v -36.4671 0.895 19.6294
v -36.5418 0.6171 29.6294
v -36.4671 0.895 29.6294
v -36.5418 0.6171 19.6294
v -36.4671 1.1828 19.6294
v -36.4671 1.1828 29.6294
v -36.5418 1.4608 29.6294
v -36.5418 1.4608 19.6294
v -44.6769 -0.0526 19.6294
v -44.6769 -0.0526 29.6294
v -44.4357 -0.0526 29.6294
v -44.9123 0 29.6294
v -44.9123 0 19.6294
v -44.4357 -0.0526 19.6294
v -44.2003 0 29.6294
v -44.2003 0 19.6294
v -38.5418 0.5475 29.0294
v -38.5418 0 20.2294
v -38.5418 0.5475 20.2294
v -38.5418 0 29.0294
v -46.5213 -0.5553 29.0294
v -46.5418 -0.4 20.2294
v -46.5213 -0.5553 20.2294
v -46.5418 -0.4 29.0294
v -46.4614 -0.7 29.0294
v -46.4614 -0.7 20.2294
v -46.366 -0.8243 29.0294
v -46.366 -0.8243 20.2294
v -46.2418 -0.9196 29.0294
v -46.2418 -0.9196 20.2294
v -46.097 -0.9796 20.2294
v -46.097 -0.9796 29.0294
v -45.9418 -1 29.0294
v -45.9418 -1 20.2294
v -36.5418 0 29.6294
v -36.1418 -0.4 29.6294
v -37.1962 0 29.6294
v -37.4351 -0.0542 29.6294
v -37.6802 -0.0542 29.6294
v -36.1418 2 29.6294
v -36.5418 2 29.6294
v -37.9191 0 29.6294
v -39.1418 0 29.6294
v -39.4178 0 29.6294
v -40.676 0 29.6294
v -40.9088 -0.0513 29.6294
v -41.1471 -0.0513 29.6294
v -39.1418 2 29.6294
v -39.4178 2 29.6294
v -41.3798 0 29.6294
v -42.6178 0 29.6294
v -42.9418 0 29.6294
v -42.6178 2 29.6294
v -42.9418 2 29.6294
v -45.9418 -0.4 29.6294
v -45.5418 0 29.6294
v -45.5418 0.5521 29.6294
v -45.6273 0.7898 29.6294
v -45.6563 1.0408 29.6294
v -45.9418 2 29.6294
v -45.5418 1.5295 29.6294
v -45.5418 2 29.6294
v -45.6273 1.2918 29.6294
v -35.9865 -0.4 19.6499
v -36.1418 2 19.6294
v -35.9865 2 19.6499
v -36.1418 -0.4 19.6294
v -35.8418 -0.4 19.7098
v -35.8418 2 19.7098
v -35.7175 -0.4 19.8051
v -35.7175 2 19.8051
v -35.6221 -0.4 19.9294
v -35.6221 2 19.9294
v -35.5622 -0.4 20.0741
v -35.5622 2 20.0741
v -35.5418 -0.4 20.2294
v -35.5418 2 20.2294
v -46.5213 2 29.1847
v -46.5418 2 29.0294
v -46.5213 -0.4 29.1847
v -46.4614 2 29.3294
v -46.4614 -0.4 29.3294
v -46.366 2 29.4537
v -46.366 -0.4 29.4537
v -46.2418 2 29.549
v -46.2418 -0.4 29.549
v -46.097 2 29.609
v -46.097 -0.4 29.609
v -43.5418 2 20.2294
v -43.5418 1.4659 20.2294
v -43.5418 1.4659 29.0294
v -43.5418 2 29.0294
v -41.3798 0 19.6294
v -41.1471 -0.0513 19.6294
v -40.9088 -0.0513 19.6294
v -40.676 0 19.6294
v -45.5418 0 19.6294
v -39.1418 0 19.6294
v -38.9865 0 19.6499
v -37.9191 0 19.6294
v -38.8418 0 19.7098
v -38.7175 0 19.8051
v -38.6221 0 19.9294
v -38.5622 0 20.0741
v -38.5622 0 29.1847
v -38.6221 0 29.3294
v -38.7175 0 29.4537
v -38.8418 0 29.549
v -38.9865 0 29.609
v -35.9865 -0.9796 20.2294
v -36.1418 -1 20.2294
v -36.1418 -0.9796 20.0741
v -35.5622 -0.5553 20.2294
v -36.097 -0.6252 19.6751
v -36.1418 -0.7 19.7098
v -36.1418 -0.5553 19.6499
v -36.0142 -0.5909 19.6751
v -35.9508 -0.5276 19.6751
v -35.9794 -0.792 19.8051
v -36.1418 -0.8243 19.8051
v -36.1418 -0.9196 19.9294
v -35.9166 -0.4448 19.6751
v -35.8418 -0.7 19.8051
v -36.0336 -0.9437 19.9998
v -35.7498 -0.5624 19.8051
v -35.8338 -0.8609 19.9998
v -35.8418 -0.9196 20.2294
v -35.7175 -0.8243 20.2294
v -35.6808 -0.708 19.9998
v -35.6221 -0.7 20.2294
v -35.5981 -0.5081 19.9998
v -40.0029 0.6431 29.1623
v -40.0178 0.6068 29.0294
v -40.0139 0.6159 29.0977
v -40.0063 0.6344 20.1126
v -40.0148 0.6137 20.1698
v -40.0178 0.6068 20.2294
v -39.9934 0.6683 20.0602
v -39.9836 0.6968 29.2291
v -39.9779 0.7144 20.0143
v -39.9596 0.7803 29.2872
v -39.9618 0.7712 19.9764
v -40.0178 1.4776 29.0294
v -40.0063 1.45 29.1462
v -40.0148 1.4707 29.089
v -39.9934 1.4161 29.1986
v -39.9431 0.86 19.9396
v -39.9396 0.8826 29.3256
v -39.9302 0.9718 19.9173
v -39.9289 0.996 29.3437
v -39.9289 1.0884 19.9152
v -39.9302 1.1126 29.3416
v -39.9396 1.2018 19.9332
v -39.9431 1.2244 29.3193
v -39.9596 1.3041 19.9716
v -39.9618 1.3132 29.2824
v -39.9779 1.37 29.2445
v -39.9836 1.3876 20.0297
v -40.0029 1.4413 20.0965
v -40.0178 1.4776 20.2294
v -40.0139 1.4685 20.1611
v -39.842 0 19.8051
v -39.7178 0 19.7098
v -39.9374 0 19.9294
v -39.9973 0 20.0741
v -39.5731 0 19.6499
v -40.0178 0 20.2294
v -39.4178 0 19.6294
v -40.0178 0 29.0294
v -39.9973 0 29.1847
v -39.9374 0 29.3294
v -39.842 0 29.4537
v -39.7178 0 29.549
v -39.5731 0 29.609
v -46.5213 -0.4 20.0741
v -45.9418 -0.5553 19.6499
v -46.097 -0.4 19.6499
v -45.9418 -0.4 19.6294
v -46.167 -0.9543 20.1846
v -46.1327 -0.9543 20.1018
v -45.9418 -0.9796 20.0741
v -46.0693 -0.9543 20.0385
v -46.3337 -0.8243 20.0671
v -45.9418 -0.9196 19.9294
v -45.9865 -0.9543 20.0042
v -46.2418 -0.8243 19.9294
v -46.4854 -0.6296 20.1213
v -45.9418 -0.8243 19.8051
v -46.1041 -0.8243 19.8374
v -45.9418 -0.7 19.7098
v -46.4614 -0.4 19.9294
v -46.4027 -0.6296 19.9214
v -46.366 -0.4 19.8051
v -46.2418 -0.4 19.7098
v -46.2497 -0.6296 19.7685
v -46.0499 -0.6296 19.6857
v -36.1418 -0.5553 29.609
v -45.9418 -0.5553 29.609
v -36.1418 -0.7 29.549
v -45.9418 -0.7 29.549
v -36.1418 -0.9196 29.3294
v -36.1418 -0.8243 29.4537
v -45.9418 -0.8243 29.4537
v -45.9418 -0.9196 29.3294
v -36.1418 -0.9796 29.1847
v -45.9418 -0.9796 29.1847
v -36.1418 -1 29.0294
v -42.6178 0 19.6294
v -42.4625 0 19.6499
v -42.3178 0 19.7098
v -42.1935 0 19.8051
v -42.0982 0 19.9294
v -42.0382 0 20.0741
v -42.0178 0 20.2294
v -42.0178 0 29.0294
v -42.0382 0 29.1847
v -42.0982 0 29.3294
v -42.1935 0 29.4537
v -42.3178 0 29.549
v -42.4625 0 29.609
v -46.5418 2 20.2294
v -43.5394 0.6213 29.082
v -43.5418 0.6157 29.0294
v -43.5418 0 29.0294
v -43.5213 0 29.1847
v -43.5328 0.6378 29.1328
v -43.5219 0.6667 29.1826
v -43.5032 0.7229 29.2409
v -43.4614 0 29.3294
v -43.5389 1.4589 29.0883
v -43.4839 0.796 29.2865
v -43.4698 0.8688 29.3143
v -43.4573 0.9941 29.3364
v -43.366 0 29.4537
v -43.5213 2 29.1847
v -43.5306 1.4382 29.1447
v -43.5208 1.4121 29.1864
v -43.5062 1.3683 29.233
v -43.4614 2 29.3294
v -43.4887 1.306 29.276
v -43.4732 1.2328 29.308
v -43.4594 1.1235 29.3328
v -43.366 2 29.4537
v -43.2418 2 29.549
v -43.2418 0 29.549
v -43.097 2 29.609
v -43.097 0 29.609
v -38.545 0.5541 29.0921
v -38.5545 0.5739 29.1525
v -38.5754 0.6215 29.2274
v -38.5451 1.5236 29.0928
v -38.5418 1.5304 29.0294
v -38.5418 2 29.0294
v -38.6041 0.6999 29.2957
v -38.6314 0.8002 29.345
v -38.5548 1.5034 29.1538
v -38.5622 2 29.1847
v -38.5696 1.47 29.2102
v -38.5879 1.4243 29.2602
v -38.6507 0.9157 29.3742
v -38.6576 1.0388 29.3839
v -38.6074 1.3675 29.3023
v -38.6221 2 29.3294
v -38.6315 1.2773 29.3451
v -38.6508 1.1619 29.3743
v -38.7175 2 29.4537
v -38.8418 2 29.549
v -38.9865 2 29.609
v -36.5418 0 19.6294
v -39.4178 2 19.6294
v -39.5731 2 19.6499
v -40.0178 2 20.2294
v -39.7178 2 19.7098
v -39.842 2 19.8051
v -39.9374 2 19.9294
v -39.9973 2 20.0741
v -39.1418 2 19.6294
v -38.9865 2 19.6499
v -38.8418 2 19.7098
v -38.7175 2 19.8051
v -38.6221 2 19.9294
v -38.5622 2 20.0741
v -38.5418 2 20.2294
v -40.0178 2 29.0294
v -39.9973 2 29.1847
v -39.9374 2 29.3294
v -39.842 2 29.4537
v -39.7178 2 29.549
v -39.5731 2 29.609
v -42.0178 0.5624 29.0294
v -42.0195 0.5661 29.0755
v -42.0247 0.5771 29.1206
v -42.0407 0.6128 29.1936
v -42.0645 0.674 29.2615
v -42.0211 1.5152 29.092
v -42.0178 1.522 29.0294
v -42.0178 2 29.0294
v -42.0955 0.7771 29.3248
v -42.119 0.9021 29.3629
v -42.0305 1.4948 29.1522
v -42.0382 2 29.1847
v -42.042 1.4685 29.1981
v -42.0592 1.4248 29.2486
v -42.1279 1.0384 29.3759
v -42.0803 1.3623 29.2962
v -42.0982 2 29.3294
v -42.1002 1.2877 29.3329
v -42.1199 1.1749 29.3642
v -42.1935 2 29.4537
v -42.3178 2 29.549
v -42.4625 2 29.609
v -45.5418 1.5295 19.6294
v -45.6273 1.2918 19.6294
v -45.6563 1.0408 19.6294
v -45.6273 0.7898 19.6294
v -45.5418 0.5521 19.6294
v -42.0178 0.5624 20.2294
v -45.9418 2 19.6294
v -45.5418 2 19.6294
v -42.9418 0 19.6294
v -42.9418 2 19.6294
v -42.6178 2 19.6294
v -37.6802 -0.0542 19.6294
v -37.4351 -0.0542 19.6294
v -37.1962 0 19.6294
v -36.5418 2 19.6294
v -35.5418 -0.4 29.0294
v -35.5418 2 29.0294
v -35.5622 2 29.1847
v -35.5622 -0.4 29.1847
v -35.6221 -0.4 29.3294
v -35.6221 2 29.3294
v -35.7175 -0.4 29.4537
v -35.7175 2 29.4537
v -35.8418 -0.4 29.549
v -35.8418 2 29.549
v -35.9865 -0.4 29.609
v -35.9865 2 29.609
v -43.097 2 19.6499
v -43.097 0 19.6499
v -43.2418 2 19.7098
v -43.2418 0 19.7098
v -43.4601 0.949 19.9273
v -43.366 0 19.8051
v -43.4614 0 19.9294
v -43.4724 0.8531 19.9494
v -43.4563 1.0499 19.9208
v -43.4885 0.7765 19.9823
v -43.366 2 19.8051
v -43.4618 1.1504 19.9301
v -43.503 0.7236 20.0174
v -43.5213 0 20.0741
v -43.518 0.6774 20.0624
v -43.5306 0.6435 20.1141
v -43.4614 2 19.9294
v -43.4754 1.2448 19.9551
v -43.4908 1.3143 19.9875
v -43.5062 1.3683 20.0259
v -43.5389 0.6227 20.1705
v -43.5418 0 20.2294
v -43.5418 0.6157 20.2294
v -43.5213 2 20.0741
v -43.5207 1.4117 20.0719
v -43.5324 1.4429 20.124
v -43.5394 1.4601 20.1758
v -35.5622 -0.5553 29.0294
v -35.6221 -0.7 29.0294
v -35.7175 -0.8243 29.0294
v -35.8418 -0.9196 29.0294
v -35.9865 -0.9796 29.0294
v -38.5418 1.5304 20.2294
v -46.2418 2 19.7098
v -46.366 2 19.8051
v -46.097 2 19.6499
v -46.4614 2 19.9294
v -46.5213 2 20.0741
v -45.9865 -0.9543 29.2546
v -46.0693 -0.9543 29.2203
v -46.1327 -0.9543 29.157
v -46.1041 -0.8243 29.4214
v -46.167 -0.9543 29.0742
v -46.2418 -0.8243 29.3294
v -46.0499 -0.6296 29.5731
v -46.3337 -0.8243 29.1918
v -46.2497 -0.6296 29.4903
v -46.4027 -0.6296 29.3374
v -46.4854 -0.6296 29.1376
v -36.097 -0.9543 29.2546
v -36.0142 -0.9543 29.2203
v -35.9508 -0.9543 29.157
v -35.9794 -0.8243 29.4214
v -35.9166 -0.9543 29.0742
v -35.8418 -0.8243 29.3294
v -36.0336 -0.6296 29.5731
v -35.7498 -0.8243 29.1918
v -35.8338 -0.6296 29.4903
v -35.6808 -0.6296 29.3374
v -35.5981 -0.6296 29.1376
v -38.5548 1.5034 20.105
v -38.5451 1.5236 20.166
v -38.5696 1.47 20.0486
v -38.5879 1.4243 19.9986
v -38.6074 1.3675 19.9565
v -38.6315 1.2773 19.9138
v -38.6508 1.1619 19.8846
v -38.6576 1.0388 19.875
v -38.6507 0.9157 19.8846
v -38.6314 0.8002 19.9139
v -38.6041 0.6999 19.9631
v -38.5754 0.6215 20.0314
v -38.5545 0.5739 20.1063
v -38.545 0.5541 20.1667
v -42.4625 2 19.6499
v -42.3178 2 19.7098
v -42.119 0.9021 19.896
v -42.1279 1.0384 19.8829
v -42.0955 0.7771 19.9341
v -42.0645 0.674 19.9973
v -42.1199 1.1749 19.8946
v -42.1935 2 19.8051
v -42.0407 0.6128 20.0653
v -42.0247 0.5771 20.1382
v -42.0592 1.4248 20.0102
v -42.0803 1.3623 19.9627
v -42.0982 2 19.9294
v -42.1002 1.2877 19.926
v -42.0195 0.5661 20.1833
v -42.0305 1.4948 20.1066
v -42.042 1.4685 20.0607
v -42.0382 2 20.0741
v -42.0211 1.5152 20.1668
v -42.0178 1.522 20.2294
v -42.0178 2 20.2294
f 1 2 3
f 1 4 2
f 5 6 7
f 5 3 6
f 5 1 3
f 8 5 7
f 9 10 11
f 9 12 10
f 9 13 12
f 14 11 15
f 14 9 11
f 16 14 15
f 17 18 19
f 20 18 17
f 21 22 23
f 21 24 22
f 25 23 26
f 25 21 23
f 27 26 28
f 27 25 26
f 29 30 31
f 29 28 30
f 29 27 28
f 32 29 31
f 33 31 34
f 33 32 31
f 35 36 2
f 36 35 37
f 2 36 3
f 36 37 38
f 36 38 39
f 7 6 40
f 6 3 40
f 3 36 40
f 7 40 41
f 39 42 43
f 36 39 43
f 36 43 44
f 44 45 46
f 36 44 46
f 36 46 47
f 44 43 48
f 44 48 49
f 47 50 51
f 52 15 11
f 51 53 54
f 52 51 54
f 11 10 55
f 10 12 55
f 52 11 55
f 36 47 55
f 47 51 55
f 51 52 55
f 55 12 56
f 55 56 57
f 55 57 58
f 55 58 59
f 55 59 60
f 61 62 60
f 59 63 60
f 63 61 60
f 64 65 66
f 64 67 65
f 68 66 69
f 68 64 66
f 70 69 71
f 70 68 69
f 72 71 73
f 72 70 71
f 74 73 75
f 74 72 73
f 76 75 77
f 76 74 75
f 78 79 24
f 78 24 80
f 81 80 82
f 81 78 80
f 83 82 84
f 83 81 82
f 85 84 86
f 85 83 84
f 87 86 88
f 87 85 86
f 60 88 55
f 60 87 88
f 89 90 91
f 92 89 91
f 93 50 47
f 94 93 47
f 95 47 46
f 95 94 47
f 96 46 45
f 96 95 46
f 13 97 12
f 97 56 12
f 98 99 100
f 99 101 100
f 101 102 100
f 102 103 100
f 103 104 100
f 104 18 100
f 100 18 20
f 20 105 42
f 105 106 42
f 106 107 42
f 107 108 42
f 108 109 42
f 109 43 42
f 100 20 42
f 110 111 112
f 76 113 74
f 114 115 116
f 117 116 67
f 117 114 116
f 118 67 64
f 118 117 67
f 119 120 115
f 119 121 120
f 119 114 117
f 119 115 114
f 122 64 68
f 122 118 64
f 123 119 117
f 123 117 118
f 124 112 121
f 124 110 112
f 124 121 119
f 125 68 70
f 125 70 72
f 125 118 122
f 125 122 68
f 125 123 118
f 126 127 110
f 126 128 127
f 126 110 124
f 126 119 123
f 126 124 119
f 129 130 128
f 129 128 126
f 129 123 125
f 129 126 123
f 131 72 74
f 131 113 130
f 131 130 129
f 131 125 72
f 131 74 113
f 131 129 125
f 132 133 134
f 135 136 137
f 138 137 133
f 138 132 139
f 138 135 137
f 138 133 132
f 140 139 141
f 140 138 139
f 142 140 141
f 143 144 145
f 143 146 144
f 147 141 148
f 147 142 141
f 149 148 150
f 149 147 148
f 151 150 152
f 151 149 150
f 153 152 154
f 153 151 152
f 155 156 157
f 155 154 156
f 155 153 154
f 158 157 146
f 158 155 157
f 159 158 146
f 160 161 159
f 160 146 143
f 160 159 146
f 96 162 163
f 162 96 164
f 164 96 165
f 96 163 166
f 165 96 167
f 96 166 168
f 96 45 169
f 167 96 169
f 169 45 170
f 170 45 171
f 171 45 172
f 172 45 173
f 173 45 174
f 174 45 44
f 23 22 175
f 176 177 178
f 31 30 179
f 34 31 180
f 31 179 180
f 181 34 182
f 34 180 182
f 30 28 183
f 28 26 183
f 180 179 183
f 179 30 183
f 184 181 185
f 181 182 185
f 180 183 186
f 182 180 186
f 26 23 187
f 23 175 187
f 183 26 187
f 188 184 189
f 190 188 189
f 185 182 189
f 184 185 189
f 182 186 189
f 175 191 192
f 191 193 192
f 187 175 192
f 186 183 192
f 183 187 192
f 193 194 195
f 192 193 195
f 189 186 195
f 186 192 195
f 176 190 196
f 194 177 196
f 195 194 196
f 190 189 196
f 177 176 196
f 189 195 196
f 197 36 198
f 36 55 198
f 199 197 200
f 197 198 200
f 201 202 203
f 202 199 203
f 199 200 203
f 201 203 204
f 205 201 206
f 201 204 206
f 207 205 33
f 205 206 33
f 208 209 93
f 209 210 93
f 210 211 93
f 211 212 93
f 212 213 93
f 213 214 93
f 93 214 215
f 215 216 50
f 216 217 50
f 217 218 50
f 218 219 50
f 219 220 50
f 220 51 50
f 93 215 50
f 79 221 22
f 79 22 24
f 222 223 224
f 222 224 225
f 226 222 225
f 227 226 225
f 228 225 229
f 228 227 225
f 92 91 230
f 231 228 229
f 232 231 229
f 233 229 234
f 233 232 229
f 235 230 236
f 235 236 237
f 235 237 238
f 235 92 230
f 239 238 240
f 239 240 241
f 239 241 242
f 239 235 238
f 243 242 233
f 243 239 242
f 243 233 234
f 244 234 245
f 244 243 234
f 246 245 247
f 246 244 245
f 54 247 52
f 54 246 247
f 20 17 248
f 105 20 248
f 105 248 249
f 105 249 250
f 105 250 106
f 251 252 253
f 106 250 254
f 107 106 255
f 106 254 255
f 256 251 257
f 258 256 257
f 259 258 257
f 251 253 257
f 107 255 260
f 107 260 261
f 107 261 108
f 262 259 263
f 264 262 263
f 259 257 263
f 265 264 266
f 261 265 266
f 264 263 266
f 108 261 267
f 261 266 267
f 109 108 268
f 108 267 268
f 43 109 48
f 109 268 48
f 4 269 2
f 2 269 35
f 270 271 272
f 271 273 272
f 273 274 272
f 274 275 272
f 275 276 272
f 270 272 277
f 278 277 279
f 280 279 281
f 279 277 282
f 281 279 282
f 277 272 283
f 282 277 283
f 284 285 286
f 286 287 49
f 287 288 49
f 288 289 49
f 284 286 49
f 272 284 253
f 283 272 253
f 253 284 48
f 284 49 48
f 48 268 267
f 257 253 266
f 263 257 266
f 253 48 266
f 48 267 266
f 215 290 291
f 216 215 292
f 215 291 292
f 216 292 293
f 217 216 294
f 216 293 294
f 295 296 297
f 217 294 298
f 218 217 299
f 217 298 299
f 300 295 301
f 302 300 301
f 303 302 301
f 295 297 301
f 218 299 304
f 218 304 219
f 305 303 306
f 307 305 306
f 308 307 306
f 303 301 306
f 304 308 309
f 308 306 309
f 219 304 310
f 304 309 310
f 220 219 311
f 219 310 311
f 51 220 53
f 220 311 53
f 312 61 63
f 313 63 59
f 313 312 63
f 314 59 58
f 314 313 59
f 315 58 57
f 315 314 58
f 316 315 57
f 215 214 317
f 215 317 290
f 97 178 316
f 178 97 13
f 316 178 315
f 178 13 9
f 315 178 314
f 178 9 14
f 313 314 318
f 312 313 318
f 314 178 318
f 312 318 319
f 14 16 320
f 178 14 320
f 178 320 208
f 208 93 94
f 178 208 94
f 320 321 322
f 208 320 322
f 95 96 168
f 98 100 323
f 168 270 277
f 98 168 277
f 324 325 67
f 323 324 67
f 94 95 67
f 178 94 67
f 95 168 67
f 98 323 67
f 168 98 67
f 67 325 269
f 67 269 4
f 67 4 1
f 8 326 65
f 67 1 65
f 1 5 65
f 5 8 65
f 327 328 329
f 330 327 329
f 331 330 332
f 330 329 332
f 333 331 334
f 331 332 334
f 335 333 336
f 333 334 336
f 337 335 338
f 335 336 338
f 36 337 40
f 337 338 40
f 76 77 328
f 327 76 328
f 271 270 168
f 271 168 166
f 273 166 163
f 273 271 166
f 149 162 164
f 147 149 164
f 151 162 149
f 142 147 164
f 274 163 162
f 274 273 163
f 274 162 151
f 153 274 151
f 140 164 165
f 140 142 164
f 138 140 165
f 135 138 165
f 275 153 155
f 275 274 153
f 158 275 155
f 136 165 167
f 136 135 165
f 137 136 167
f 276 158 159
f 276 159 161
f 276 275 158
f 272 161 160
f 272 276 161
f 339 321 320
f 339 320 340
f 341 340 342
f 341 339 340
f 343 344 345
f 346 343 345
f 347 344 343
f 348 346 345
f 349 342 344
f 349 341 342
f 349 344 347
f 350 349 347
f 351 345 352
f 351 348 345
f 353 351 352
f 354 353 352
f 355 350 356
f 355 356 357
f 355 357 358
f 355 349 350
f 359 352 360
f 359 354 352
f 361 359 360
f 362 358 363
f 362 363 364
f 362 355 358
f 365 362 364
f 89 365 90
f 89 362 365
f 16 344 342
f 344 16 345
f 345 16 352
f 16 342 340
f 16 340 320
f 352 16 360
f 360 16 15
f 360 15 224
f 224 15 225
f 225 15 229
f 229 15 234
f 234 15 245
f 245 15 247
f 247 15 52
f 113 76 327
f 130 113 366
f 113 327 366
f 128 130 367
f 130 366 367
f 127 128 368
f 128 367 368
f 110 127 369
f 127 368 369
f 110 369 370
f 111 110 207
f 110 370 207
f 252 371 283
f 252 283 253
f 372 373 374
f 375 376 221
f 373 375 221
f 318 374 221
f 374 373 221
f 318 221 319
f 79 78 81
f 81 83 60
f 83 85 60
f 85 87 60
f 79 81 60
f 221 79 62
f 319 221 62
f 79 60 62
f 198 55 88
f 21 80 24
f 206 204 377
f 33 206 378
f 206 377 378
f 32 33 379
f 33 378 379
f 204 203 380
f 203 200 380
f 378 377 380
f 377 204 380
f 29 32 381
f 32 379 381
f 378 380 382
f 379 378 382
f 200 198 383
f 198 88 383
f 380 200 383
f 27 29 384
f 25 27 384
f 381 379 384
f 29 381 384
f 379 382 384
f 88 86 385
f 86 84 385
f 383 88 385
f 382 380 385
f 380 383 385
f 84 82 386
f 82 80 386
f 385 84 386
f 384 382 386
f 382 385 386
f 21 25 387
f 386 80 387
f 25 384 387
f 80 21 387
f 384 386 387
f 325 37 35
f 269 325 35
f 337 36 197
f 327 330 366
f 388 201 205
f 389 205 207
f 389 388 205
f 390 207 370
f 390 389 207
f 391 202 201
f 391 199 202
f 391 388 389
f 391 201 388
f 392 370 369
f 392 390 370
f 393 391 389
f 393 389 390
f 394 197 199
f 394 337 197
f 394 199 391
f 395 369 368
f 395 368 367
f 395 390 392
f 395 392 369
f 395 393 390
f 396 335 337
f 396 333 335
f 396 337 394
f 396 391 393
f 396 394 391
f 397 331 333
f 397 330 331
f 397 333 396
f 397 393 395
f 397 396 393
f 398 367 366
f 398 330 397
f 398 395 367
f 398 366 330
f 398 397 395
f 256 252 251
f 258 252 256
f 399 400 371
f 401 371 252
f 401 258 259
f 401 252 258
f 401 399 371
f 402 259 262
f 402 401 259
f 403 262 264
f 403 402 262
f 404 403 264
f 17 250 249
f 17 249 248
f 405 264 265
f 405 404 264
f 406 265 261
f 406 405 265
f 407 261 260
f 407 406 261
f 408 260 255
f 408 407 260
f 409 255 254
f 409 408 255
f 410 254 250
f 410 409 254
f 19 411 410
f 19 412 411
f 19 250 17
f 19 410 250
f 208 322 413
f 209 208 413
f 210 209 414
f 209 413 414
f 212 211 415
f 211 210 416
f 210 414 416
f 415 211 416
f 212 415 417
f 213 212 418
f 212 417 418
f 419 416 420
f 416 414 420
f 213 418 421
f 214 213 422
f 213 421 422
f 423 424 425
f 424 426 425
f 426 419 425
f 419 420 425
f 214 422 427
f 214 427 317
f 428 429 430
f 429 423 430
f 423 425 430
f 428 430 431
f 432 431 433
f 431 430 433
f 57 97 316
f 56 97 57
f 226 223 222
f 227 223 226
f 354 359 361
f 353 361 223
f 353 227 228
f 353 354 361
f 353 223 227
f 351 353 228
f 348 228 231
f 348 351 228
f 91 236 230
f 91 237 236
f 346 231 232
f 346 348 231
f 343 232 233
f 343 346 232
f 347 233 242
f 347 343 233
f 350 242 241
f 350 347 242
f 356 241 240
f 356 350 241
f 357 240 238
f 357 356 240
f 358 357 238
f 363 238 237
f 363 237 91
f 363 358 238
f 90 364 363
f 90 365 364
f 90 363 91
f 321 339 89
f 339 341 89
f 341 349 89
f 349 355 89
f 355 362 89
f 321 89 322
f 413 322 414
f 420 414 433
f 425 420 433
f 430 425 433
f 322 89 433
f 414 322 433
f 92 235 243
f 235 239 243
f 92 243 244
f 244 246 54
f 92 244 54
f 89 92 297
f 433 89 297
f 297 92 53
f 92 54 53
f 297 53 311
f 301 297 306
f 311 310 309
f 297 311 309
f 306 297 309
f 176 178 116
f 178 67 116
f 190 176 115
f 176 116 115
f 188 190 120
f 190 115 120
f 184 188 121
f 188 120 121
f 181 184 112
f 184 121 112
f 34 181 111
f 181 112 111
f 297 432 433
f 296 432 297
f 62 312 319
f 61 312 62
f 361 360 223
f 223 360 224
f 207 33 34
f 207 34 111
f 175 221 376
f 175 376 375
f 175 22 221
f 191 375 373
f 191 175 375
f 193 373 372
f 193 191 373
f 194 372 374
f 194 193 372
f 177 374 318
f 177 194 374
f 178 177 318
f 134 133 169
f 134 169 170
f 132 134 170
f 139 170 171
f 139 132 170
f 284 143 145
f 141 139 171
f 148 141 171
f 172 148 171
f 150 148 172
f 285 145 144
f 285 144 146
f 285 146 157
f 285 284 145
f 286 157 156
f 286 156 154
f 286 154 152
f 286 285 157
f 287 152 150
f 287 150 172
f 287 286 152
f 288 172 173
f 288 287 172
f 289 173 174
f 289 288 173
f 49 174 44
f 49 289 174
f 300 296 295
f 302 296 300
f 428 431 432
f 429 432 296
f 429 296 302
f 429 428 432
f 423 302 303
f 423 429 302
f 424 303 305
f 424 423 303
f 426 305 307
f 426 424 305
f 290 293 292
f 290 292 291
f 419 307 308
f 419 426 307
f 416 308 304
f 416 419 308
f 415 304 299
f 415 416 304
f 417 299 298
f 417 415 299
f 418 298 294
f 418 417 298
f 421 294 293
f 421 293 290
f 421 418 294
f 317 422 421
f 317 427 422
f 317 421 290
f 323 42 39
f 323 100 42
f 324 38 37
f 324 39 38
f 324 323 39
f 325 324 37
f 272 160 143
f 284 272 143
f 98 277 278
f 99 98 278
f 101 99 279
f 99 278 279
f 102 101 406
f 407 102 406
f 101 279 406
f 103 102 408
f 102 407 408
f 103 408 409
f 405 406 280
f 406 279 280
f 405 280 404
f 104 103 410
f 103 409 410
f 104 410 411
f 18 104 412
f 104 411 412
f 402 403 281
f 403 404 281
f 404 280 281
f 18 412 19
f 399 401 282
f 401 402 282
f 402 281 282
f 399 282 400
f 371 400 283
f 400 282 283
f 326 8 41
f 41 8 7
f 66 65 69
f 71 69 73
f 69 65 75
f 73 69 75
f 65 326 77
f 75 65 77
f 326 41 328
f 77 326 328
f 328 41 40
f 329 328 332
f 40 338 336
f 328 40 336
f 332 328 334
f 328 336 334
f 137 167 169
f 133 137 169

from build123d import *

# Parameters (mm, degrees)
F0_W     = 1
F0_H     = 10
F1_DEPTH = 2
F0_W_2   = 1.5239776969
F0_W_3   = 1.4760223031
F0_W_4   = 2
F2_DEPTH = 1
F3_R     = 0.6
F4_R     = 1.1
F5_DEPTH = 50


with BuildPart() as f1:
    # F0 (on Front) → F1 (new body)
    with BuildSketch(Plane.XZ):
        with Locations((-46.041754216, 24.6294103354)):
            Rectangle(F0_W, F0_H)
    extrude(amount=-F1_DEPTH)



with BuildPart() as f1b:
    # F0 (on Front) → F1, piece 2 (new body)
    with BuildSketch(Plane.XZ):
        with Locations((-42.7797653675, 24.6294103354)):
            Rectangle(F0_W_2, F0_H)
    extrude(amount=-F1_DEPTH)


with BuildPart() as f1c:
    # F0 (on Front) → F1, piece 3 (new body)
    with BuildSketch(Plane.XZ):
        with Locations((-39.2797653675, 24.6294103354)):
            Rectangle(F0_W_3, F0_H)
    extrude(amount=-F1_DEPTH)


with BuildPart() as f1d:
    # F0 (on Front) → F1, piece 4 (new body)
    with BuildSketch(Plane.XZ):
        with Locations((-36.041754216, 24.6294103354)):
            Rectangle(F0_W, F0_H)
    extrude(amount=-F1_DEPTH)


with BuildPart() as f1_1:
    add(f1.part)

    add(f1b.part)  # F2 merges F1b

    add(f1c.part)  # F2 merges F1c

    add(f1d.part)  # F2 merges F1d
    # F0 (on Front) → F2 (join)
    with BuildSketch(Plane.XZ):
        with Locations((-41.0177765191, 24.6294103354)):
            Rectangle(F0_W_4, F0_H)
        with Locations((-39.2797653675, 24.6294103354)):
            Rectangle(F0_W_3, F0_H)
        with Locations((-46.041754216, 24.6294103354)):
            Rectangle(F0_W, F0_H)
        with Locations((-44.541754216, 24.6294103354)):
            Rectangle(F0_W_4, F0_H)
        with Locations((-36.041754216, 24.6294103354)):
            Rectangle(F0_W, F0_H)
        with Locations((-42.7797653675, 24.6294103354)):
            Rectangle(F0_W_2, F0_H)
        with Locations((-37.541754216, 24.6294103354)):
            Rectangle(F0_W_4, F0_H)
    extrude(amount=F2_DEPTH)

    # F3
    f3_edges = [f1_1.edges().sort_by_distance(p)[0] for p in [
        (-43.541754, 1, 29.62941),
        (-42.017777, 1, 29.62941),
        (-40.017777, 1, 19.62941),
        (-38.541754, 1, 19.62941),
        (-40.017777, 1, 29.62941),
        (-38.541754, 1, 29.62941),
        (-43.541754, 1, 19.62941),
        (-42.017777, 1, 19.62941),
        (-46.541754, 0.5, 19.62941),
        (-46.541754, 0.5, 29.62941),
        (-35.541754, 0.5, 29.62941),
        (-41.041754, -1, 29.62941),
        (-35.541754, -1, 24.62941),
        (-46.541754, -1, 24.62941),
        (-41.041754, -1, 19.62941),
        (-35.541754, 0.5, 19.62941),
    ]]
    fillet(f3_edges, radius=F3_R)

    # F4 (on Top) → F5 (cut)
    with BuildSketch(Plane.XY):
        with Locations((-37.5576429069, 1.0389162926)):
            Circle(F4_R)
        with Locations((-41.0279254586, 1.0422003123)):
            Circle(F4_R)
        with Locations((-44.5562924673, 1.0408099828)):
            Circle(F4_R)
    extrude(amount=F5_DEPTH, mode=Mode.SUBTRACT)


solid = f1_1.part
